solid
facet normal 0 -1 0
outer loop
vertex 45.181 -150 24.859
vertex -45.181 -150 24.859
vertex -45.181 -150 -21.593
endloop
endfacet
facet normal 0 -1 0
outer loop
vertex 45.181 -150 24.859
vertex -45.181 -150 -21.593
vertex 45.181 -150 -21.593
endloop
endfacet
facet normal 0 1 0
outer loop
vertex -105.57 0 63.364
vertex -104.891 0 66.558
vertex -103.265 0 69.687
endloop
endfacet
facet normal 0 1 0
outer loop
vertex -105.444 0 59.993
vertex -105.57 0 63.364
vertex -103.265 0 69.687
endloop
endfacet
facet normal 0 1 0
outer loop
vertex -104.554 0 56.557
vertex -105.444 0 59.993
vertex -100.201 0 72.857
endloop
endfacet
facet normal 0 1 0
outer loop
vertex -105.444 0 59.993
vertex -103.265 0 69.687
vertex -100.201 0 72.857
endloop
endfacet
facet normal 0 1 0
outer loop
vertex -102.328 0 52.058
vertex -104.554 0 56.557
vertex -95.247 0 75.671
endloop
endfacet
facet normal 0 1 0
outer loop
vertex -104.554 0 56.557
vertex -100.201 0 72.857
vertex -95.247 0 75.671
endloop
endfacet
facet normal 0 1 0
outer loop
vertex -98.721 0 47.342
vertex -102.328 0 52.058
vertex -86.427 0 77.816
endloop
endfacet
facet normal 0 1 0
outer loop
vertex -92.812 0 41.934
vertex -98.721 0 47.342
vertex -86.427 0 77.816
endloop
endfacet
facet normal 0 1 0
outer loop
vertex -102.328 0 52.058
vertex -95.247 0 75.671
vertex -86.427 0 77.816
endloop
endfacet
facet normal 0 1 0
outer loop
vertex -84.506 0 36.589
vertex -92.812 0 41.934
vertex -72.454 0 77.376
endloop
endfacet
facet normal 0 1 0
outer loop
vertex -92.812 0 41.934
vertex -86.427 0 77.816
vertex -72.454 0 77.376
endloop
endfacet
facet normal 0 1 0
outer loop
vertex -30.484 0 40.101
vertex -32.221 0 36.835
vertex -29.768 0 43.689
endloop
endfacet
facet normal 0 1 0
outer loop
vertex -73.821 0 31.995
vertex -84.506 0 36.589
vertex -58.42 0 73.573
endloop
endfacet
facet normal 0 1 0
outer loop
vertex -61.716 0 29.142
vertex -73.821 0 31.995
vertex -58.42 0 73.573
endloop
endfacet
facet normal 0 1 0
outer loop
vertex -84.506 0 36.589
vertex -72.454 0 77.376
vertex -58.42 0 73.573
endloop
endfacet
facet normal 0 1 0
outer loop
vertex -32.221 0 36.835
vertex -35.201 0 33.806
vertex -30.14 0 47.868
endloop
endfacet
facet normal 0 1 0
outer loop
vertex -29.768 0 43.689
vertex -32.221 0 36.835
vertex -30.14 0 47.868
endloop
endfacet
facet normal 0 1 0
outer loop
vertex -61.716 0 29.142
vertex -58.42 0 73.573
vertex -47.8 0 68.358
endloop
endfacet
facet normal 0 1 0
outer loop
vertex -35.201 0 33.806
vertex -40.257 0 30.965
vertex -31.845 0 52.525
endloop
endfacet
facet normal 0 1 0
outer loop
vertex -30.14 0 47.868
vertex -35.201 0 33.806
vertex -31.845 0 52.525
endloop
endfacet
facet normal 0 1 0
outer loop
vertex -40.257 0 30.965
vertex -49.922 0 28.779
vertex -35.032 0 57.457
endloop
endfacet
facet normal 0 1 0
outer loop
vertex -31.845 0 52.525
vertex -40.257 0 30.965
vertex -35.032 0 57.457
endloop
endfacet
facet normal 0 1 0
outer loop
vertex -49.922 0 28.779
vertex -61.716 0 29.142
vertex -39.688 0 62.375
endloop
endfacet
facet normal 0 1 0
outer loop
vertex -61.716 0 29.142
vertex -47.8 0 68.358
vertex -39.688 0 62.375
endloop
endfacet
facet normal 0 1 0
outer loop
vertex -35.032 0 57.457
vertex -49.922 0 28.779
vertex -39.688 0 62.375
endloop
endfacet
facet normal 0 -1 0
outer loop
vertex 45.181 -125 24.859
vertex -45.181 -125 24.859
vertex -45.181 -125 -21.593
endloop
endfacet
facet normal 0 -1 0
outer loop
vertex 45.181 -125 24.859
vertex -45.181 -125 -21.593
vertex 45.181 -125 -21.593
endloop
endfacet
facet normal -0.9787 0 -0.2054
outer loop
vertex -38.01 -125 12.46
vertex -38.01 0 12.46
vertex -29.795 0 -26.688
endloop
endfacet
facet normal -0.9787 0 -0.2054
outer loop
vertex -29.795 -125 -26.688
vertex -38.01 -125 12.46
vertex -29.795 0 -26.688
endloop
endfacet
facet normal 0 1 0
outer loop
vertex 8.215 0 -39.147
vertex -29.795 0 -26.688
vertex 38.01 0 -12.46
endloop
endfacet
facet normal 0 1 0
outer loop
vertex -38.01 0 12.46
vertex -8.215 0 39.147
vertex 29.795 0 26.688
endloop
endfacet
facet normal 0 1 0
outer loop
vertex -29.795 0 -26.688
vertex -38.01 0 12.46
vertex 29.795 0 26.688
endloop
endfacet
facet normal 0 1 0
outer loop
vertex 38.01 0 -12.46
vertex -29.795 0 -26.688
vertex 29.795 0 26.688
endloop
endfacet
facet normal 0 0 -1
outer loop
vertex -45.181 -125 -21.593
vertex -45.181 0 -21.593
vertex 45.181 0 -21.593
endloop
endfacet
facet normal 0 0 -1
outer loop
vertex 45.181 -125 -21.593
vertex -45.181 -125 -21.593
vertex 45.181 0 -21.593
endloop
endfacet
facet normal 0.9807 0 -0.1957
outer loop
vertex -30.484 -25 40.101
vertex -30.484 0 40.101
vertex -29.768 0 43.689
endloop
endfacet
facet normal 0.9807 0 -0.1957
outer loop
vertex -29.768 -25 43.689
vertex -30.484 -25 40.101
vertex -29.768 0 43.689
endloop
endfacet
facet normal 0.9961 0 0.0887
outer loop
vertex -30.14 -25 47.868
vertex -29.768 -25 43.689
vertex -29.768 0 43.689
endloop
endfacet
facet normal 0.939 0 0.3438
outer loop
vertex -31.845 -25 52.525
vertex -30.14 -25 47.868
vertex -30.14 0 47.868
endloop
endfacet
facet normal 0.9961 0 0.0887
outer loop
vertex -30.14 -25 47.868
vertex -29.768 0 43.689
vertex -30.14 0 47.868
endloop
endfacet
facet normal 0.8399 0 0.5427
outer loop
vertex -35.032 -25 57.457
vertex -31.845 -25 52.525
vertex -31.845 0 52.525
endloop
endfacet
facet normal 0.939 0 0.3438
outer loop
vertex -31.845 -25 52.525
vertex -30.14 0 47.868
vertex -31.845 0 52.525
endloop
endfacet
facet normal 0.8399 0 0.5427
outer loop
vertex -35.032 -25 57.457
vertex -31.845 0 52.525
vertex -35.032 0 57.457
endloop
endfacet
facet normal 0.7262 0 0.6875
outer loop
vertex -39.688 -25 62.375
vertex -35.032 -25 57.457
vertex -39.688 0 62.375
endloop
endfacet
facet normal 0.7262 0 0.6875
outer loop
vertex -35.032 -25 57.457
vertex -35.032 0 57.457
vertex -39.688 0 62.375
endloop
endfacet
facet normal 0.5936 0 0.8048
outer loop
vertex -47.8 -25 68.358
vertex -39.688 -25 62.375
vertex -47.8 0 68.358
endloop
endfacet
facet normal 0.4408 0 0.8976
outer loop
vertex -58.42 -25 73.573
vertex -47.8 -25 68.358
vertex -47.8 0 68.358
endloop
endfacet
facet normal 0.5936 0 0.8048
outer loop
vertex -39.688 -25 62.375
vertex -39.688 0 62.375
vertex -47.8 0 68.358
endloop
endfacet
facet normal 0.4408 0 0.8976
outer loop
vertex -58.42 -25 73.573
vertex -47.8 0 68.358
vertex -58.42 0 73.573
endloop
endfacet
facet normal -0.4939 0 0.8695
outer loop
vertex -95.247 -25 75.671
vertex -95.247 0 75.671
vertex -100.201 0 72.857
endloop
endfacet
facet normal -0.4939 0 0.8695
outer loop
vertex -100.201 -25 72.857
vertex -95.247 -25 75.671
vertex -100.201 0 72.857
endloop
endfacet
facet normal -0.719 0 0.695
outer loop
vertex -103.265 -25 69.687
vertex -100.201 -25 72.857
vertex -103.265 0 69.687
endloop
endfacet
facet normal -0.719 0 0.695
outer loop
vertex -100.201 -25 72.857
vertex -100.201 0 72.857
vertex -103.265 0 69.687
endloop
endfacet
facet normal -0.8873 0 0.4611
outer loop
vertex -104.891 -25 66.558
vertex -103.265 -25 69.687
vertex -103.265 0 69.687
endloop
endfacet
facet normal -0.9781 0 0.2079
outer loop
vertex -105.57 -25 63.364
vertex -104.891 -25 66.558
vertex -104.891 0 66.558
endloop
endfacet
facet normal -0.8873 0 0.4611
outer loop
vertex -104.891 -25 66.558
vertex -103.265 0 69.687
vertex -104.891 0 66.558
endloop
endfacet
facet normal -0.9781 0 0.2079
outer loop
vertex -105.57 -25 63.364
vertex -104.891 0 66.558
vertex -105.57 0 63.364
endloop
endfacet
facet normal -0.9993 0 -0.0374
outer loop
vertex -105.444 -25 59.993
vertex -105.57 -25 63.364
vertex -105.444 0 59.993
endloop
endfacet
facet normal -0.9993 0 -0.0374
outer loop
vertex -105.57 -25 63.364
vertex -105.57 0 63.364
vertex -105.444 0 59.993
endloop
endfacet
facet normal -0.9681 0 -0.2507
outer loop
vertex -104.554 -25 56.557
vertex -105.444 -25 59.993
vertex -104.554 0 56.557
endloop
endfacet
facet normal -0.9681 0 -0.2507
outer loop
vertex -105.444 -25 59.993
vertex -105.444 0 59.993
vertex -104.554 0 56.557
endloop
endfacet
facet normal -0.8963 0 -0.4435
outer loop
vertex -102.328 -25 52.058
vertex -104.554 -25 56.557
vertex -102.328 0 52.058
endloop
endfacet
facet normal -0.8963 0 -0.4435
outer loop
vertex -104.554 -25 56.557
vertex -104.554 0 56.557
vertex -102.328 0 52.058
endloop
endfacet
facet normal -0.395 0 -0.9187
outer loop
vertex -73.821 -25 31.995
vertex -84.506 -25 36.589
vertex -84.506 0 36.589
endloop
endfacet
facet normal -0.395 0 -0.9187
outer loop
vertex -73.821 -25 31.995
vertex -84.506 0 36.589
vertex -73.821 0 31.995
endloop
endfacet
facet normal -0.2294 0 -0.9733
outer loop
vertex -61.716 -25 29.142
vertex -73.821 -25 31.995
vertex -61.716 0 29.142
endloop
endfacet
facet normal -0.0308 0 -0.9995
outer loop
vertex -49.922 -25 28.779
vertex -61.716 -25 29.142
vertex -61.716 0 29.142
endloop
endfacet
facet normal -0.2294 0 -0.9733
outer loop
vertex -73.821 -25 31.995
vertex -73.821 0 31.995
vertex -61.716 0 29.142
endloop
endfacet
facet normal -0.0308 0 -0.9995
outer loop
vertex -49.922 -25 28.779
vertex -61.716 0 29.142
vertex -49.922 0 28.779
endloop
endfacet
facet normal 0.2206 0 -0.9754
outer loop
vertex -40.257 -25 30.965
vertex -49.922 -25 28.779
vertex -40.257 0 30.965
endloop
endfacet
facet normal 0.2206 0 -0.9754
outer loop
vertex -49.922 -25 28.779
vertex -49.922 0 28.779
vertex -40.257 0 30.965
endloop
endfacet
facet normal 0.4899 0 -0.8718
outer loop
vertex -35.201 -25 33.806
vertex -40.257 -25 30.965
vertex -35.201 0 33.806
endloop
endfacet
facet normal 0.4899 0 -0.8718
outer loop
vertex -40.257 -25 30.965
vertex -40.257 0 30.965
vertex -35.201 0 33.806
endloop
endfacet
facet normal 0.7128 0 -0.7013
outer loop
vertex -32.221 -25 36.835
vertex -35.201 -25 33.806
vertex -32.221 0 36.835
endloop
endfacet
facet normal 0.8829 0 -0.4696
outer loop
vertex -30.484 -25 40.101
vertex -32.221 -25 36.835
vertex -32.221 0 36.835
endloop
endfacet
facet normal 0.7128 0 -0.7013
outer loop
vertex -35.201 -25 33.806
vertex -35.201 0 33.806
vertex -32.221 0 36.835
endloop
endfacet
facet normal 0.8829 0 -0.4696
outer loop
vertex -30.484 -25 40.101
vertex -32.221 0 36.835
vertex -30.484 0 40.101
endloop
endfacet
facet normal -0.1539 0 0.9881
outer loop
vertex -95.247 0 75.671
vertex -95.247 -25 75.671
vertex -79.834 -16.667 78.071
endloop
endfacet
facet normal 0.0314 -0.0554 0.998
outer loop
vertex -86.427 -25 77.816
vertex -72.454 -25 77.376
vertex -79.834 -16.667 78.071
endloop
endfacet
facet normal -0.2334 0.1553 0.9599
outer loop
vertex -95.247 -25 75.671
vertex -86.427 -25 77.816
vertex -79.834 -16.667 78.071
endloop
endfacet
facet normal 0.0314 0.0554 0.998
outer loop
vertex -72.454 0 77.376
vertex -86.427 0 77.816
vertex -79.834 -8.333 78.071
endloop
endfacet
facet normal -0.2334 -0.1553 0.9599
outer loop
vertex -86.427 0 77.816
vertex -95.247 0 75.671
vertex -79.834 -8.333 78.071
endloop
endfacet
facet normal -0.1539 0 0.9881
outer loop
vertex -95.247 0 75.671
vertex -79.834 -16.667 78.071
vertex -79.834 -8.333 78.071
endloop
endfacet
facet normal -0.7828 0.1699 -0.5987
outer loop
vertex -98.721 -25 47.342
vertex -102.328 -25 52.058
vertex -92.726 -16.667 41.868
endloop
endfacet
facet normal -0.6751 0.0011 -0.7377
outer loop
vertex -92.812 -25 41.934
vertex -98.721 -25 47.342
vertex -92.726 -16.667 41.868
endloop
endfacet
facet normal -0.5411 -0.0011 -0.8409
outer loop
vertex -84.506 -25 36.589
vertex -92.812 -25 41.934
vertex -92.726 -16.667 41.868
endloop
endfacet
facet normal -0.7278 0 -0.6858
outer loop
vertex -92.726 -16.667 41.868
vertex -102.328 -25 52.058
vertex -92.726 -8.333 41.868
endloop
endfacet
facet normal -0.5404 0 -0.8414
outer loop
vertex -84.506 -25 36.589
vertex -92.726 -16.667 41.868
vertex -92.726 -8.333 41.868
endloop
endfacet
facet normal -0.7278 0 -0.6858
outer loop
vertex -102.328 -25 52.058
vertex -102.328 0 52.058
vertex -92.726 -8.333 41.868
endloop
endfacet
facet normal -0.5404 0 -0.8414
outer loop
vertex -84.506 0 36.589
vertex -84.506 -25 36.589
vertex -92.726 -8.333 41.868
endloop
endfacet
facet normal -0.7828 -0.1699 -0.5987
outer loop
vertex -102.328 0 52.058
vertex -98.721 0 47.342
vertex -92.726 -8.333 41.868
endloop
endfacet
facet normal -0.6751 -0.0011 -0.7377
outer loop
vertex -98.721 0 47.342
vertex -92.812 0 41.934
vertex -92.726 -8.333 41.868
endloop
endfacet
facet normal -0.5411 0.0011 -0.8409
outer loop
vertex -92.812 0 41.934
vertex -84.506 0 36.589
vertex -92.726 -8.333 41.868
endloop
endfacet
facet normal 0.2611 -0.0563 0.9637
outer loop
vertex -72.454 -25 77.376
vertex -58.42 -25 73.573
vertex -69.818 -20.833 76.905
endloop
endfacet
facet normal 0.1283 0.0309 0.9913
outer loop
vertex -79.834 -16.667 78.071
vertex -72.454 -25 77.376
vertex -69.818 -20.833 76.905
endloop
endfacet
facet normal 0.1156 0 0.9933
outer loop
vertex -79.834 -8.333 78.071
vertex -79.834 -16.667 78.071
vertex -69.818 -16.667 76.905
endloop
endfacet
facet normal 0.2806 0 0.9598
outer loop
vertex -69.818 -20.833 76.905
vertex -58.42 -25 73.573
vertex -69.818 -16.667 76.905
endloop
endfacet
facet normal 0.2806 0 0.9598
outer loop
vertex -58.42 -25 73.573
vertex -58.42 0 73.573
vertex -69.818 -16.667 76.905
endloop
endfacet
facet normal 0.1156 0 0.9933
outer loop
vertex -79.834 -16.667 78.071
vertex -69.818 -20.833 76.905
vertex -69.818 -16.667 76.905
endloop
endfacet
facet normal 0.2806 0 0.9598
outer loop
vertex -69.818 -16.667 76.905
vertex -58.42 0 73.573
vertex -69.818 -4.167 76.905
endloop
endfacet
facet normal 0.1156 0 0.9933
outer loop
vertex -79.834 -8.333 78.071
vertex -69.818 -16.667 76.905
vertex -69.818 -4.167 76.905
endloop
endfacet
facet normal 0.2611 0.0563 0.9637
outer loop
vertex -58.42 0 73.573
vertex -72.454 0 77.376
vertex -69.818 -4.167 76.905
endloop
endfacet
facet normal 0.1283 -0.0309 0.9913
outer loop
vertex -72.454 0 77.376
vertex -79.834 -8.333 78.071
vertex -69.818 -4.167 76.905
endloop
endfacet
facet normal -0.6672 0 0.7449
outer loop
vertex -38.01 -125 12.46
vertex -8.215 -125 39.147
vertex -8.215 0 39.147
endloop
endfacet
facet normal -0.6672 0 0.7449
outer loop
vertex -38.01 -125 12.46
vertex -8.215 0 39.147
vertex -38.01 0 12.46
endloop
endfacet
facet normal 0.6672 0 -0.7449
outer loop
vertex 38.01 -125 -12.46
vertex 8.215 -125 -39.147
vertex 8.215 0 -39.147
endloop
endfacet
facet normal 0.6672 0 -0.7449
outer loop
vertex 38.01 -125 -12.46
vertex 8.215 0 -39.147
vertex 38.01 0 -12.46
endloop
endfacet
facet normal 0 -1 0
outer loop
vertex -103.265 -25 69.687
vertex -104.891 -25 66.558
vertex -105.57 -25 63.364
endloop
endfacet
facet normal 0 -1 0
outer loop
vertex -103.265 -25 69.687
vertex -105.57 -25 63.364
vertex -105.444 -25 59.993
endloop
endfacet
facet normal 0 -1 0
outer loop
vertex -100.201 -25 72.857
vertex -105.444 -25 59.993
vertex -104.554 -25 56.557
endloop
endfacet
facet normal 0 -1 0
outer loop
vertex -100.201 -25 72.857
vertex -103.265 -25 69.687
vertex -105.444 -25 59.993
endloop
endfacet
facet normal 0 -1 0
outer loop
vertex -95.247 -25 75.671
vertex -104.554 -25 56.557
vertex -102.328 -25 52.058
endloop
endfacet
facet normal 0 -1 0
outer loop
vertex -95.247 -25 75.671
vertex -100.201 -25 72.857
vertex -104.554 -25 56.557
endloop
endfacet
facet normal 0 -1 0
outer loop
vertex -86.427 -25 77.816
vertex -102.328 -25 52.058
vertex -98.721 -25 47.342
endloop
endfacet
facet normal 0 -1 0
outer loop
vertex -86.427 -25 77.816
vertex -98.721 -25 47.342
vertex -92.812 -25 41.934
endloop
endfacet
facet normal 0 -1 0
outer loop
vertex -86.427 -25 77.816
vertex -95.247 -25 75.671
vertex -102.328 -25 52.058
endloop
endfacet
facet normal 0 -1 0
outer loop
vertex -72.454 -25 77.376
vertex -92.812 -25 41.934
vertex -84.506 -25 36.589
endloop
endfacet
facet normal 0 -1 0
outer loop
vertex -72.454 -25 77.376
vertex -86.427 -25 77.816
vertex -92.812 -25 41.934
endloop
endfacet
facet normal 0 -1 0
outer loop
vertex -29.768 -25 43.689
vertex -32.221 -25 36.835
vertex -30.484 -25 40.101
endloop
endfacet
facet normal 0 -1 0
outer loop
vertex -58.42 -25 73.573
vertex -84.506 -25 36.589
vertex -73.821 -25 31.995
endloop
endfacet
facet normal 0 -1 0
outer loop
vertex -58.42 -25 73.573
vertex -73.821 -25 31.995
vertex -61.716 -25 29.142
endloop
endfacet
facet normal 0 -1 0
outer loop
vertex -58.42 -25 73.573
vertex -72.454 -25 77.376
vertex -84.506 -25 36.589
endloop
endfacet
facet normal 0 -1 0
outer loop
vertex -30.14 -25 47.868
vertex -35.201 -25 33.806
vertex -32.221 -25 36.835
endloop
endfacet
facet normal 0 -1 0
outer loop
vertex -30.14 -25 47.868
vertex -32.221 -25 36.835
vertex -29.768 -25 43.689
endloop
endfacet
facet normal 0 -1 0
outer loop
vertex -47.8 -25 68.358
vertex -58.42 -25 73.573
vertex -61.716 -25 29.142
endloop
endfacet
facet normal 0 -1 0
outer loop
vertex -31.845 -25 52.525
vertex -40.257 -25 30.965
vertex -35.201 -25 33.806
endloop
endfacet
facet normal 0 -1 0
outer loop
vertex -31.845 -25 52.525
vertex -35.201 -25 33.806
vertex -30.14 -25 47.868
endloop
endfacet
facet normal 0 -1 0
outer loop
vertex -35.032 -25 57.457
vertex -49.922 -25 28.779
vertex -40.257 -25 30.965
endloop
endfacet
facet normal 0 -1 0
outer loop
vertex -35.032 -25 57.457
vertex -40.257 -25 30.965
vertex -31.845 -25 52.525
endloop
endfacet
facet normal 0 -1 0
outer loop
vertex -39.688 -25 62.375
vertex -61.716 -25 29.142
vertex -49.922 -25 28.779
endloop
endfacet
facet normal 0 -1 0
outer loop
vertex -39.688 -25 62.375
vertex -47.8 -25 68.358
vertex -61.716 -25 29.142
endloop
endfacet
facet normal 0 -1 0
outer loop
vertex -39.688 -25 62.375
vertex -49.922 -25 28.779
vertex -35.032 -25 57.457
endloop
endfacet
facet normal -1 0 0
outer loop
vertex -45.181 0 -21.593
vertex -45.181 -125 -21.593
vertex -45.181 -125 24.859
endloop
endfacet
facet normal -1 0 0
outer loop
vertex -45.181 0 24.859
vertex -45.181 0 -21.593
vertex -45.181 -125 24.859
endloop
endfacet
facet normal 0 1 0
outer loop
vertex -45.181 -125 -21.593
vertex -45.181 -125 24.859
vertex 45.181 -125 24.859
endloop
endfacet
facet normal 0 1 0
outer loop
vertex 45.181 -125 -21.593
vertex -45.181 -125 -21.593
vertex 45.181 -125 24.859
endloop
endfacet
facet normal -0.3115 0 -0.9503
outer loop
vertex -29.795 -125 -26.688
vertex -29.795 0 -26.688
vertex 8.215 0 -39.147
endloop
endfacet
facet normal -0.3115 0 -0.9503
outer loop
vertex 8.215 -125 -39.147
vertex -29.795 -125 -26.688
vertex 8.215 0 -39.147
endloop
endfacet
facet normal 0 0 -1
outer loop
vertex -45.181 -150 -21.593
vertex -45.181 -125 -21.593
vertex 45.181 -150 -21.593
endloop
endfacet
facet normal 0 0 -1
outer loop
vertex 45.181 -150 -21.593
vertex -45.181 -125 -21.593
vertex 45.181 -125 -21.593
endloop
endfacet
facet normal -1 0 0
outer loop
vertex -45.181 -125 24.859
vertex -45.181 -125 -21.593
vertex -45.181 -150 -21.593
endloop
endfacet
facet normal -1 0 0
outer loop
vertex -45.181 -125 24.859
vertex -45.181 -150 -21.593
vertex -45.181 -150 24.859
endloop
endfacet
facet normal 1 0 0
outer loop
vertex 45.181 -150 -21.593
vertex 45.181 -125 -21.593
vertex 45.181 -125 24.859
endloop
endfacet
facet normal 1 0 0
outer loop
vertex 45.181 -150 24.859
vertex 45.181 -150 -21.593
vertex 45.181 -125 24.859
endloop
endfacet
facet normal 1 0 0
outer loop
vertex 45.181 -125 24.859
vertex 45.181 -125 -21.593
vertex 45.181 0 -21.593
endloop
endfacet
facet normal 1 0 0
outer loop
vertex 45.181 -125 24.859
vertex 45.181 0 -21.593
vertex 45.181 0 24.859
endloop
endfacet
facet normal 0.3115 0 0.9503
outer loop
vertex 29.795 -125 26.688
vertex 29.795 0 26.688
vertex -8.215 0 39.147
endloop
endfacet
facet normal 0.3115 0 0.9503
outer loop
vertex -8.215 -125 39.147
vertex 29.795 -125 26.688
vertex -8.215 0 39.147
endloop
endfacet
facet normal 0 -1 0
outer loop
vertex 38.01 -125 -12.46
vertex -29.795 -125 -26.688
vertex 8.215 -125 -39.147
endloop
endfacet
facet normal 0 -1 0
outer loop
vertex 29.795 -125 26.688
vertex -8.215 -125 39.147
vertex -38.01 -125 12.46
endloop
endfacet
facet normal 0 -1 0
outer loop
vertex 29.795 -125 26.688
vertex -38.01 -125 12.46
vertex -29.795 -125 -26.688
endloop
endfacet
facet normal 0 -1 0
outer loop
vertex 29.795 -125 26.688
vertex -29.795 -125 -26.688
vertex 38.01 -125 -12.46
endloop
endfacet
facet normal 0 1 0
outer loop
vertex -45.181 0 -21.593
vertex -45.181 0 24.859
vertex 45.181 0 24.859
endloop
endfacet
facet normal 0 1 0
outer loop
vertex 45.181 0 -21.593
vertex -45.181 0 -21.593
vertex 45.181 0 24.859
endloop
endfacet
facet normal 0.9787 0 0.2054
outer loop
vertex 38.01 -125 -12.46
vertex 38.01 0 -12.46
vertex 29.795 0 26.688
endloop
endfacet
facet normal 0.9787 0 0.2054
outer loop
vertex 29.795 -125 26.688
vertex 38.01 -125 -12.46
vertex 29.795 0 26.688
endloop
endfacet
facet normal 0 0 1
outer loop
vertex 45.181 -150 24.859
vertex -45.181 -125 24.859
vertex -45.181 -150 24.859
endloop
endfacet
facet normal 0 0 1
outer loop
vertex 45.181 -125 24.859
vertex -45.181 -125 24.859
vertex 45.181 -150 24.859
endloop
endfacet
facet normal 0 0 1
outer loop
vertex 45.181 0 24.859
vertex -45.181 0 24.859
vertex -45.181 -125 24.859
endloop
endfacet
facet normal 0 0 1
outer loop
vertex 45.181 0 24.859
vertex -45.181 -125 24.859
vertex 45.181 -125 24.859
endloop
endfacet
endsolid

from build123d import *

# Parameters (mm, degrees)
F2_DEPTH = 125
F1_W     = 90.362906456
F1_H     = 46.4516137727
F3_DEPTH = 25
F5_DEPTH = 25


with BuildPart() as f2:
    # F0 (on Front) → F2 (new body)
    with BuildSketch(Plane.XZ):
        Polygon((-8.2146767203, 39.1474020387), (-38.0099830178, 12.4595822957), (-29.7953062975, -26.687819743), (8.2146767203, -39.1474020387), (38.0099830178, -12.4595822957), (29.7953062975, 26.687819743), align=None)
    extrude(amount=F2_DEPTH)


with BuildPart() as f2b:
    # F1 (on Front) → F2, piece 2 (new body)
    with BuildSketch(Plane.XZ):
        with Locations((0, 1.6330645885)):
            Rectangle(F1_W, F1_H)
    extrude(amount=F2_DEPTH)


with BuildPart() as f3:
    # F3 (new): a face of the model
    f3_faces = [f2b.part.faces().sort_by_distance(p)[0] for p in [
        (0, -125, 1.6330645885),
    ]]
    extrude(f3_faces, amount=F3_DEPTH)


with BuildPart() as f5:
    # F4 (on Front) → F5 (new body)
    with BuildSketch(Plane.XZ):
        with BuildLine():
            add(Edge.make_bspline(
                [(-30.4838716984, 40.1008091867), (-17.591954486, 76.3041440565), (-79.8342867277, 78.0714260498), (-142.0766189694, 79.8387080431), (-92.7262039401, 41.86809118), (-43.3757889108, 3.8974743169), (-30.4838716984, 40.1008091867)],
                knots=[0, 0, 0, 2.0943951024, 2.0943951024, 4.1887902048, 4.1887902048, 6.2831853072, 6.2831853072, 6.2831853072], degree=2, weights=[1, 0.5, 1, 0.5, 1, 0.5, 1]))
        make_face()
    extrude(amount=F5_DEPTH)


solid = Compound([f2.part, f2b.part, f3.part, f5.part])
